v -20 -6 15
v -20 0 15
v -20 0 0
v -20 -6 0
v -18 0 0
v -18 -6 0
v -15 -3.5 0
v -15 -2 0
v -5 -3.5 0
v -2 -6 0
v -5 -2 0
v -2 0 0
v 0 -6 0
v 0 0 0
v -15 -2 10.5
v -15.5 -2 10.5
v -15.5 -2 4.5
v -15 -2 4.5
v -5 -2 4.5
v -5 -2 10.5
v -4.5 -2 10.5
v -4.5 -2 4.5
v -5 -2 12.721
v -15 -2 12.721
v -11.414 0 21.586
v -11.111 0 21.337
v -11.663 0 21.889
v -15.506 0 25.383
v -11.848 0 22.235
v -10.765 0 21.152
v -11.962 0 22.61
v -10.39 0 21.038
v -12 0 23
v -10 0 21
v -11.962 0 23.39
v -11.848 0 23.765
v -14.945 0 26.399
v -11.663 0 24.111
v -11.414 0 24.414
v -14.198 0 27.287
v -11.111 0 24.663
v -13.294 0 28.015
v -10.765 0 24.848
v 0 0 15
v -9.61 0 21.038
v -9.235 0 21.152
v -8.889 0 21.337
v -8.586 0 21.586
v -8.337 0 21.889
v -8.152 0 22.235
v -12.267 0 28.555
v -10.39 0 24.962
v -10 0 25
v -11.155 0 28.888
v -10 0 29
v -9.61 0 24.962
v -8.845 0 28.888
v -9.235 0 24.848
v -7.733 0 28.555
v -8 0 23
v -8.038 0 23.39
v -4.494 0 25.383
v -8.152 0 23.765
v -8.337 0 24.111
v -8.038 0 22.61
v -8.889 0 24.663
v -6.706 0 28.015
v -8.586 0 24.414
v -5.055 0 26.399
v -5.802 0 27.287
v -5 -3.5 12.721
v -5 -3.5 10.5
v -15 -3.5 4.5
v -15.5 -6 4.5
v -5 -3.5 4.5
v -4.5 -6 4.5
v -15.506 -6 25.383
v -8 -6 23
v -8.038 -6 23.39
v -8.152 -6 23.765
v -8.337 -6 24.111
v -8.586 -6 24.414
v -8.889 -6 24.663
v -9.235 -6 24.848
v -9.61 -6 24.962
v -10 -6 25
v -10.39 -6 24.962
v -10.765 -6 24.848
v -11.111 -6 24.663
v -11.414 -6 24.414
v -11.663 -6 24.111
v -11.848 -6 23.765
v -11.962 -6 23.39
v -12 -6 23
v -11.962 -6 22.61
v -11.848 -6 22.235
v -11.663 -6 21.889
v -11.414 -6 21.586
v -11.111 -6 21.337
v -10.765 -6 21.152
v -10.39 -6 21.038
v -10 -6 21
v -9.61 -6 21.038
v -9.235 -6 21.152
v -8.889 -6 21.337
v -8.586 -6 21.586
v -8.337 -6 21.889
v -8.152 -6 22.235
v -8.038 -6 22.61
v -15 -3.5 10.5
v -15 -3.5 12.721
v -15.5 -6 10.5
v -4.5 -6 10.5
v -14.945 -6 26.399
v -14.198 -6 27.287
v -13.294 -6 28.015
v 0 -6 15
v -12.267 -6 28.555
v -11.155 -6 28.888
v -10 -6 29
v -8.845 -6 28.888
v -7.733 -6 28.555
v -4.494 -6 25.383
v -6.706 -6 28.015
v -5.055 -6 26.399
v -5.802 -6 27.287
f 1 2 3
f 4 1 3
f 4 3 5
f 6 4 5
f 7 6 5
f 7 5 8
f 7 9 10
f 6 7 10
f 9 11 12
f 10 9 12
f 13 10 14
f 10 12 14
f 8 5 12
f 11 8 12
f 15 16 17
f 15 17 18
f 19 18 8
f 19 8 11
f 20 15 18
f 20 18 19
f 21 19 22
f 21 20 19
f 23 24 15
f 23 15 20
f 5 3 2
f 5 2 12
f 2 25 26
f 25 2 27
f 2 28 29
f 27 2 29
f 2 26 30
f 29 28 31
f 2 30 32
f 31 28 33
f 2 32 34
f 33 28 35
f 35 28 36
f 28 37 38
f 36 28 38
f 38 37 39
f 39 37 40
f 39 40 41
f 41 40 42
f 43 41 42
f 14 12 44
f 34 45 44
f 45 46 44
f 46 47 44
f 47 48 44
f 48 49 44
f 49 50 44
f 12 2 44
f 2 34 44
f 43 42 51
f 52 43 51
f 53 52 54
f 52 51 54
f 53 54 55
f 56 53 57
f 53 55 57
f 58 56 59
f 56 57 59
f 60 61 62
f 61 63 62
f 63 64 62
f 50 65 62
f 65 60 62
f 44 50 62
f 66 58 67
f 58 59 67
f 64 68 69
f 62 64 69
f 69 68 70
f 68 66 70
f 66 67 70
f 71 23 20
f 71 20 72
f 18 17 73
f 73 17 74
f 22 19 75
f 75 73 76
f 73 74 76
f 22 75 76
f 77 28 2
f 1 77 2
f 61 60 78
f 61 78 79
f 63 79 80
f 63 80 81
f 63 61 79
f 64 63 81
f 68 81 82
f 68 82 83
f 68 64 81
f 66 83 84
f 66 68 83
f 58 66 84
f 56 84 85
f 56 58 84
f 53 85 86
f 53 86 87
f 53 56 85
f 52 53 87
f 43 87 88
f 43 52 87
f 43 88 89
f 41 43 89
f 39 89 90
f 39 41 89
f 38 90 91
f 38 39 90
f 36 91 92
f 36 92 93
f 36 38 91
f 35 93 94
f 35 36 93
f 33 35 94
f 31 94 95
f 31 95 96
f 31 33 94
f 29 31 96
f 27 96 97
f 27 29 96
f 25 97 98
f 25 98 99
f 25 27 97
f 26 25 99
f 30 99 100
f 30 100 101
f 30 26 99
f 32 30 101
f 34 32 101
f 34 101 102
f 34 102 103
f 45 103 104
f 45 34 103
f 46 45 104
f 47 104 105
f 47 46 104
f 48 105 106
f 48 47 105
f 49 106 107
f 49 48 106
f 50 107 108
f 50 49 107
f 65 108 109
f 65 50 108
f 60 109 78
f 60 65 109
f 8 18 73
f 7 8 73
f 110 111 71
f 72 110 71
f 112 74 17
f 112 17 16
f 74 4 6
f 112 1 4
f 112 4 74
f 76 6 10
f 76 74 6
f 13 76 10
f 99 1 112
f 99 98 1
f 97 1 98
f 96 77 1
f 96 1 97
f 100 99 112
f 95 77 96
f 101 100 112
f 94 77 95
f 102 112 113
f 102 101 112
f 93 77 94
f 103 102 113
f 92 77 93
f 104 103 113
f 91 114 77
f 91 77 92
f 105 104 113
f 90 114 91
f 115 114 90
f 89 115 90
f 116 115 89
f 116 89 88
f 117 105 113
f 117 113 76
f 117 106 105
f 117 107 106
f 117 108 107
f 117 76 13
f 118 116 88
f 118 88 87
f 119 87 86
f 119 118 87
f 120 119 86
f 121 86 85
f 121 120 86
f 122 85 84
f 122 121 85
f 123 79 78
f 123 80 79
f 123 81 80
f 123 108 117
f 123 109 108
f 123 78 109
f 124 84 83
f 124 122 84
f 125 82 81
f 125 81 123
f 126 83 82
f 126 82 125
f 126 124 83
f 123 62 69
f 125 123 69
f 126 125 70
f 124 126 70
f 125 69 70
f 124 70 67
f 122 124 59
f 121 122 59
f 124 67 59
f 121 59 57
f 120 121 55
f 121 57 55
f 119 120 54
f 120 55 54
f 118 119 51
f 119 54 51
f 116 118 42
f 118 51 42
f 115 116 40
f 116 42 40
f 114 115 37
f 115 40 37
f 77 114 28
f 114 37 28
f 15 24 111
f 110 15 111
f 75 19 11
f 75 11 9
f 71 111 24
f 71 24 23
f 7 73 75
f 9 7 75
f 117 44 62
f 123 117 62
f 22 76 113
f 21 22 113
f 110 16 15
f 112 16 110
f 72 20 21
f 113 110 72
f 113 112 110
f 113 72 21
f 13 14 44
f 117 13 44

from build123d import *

# Parameters (mm, degrees)
F0_R     = 2
F0_W     = 16
F0_H     = 12.7209685743
F0_W_2   = 10
F0_H_2   = 5
F1_DEPTH = 6
F3_W     = 10
F3_H     = 1.5
F4_DEPTH = 25
F5_W     = 11
F5_H     = 6
F5_W_2   = 10
F5_H_2   = 5
F6_DEPTH = 4


with BuildPart() as f1:
    # F0 (on Front) → F1 (new body)
    with BuildSketch(Plane.XZ):
        with BuildLine():
            ThreePointArc((-4, 23), (-4.1246826636, 24.216818062), (-4.493548732, 25.383064085))
            ThreePointArc((-4.493548732, 25.383064085), (-10, 29), (-15.506451268, 25.383064085))
            ThreePointArc((-15.506451268, 25.383064085), (-11.216818062, 17.1246826636), (-4, 23))
        make_face()
        with Locations((-10, 23)):
            Circle(F0_R, mode=Mode.SUBTRACT)
        with BuildLine():
            Line((-20, 15), (0, 15))
            Line((0, 15), (-4.493548732, 25.383064085))
            ThreePointArc((-4.493548732, 25.383064085), (-4.1246826636, 24.216818062), (-4, 23))
            ThreePointArc((-4, 23), (-11.216818062, 17.1246826636), (-15.506451268, 25.383064085))
            Line((-15.506451268, 25.383064085), (-20, 15))
        make_face()
        Polygon((-2, 0), (0, 0), (0, 15), (-20, 15), (-20, 0), (-18, 0), (-18, 12.7209685743), (-2, 12.7209685743), align=None)
        with Locations((-10, 6.3604842871)):
            Rectangle(F0_W, F0_H)
        with Locations((-10, 7.5)):
            Rectangle(F0_W_2, F0_H_2, mode=Mode.SUBTRACT)
        with Locations((-10, 7.5)):
            Rectangle(F0_W_2, F0_H_2)
    extrude(amount=F1_DEPTH)

    # F3 (on line) → F4 (cut)
    with BuildSketch(Plane(origin=(0, 0, 12.7209685743), x_dir=(1, 0, 0), z_dir=(0, 0, -1))):
        with Locations((-10, 2.75)):
            Rectangle(F3_W, F3_H)
    extrude(amount=F4_DEPTH, mode=Mode.SUBTRACT)

    # F5 (on face) → F6 (cut)
    with BuildSketch(Plane.XZ.offset(6)):
        with Locations((-10, 7.5)):
            Rectangle(F5_W, F5_H)
        with Locations((-10, 7.5)):
            Rectangle(F5_W_2, F5_H_2, mode=Mode.SUBTRACT)
        with Locations((-10, 7.5)):
            Rectangle(F5_W_2, F5_H_2)
    extrude(amount=-F6_DEPTH, mode=Mode.SUBTRACT)


solid = f1.part
